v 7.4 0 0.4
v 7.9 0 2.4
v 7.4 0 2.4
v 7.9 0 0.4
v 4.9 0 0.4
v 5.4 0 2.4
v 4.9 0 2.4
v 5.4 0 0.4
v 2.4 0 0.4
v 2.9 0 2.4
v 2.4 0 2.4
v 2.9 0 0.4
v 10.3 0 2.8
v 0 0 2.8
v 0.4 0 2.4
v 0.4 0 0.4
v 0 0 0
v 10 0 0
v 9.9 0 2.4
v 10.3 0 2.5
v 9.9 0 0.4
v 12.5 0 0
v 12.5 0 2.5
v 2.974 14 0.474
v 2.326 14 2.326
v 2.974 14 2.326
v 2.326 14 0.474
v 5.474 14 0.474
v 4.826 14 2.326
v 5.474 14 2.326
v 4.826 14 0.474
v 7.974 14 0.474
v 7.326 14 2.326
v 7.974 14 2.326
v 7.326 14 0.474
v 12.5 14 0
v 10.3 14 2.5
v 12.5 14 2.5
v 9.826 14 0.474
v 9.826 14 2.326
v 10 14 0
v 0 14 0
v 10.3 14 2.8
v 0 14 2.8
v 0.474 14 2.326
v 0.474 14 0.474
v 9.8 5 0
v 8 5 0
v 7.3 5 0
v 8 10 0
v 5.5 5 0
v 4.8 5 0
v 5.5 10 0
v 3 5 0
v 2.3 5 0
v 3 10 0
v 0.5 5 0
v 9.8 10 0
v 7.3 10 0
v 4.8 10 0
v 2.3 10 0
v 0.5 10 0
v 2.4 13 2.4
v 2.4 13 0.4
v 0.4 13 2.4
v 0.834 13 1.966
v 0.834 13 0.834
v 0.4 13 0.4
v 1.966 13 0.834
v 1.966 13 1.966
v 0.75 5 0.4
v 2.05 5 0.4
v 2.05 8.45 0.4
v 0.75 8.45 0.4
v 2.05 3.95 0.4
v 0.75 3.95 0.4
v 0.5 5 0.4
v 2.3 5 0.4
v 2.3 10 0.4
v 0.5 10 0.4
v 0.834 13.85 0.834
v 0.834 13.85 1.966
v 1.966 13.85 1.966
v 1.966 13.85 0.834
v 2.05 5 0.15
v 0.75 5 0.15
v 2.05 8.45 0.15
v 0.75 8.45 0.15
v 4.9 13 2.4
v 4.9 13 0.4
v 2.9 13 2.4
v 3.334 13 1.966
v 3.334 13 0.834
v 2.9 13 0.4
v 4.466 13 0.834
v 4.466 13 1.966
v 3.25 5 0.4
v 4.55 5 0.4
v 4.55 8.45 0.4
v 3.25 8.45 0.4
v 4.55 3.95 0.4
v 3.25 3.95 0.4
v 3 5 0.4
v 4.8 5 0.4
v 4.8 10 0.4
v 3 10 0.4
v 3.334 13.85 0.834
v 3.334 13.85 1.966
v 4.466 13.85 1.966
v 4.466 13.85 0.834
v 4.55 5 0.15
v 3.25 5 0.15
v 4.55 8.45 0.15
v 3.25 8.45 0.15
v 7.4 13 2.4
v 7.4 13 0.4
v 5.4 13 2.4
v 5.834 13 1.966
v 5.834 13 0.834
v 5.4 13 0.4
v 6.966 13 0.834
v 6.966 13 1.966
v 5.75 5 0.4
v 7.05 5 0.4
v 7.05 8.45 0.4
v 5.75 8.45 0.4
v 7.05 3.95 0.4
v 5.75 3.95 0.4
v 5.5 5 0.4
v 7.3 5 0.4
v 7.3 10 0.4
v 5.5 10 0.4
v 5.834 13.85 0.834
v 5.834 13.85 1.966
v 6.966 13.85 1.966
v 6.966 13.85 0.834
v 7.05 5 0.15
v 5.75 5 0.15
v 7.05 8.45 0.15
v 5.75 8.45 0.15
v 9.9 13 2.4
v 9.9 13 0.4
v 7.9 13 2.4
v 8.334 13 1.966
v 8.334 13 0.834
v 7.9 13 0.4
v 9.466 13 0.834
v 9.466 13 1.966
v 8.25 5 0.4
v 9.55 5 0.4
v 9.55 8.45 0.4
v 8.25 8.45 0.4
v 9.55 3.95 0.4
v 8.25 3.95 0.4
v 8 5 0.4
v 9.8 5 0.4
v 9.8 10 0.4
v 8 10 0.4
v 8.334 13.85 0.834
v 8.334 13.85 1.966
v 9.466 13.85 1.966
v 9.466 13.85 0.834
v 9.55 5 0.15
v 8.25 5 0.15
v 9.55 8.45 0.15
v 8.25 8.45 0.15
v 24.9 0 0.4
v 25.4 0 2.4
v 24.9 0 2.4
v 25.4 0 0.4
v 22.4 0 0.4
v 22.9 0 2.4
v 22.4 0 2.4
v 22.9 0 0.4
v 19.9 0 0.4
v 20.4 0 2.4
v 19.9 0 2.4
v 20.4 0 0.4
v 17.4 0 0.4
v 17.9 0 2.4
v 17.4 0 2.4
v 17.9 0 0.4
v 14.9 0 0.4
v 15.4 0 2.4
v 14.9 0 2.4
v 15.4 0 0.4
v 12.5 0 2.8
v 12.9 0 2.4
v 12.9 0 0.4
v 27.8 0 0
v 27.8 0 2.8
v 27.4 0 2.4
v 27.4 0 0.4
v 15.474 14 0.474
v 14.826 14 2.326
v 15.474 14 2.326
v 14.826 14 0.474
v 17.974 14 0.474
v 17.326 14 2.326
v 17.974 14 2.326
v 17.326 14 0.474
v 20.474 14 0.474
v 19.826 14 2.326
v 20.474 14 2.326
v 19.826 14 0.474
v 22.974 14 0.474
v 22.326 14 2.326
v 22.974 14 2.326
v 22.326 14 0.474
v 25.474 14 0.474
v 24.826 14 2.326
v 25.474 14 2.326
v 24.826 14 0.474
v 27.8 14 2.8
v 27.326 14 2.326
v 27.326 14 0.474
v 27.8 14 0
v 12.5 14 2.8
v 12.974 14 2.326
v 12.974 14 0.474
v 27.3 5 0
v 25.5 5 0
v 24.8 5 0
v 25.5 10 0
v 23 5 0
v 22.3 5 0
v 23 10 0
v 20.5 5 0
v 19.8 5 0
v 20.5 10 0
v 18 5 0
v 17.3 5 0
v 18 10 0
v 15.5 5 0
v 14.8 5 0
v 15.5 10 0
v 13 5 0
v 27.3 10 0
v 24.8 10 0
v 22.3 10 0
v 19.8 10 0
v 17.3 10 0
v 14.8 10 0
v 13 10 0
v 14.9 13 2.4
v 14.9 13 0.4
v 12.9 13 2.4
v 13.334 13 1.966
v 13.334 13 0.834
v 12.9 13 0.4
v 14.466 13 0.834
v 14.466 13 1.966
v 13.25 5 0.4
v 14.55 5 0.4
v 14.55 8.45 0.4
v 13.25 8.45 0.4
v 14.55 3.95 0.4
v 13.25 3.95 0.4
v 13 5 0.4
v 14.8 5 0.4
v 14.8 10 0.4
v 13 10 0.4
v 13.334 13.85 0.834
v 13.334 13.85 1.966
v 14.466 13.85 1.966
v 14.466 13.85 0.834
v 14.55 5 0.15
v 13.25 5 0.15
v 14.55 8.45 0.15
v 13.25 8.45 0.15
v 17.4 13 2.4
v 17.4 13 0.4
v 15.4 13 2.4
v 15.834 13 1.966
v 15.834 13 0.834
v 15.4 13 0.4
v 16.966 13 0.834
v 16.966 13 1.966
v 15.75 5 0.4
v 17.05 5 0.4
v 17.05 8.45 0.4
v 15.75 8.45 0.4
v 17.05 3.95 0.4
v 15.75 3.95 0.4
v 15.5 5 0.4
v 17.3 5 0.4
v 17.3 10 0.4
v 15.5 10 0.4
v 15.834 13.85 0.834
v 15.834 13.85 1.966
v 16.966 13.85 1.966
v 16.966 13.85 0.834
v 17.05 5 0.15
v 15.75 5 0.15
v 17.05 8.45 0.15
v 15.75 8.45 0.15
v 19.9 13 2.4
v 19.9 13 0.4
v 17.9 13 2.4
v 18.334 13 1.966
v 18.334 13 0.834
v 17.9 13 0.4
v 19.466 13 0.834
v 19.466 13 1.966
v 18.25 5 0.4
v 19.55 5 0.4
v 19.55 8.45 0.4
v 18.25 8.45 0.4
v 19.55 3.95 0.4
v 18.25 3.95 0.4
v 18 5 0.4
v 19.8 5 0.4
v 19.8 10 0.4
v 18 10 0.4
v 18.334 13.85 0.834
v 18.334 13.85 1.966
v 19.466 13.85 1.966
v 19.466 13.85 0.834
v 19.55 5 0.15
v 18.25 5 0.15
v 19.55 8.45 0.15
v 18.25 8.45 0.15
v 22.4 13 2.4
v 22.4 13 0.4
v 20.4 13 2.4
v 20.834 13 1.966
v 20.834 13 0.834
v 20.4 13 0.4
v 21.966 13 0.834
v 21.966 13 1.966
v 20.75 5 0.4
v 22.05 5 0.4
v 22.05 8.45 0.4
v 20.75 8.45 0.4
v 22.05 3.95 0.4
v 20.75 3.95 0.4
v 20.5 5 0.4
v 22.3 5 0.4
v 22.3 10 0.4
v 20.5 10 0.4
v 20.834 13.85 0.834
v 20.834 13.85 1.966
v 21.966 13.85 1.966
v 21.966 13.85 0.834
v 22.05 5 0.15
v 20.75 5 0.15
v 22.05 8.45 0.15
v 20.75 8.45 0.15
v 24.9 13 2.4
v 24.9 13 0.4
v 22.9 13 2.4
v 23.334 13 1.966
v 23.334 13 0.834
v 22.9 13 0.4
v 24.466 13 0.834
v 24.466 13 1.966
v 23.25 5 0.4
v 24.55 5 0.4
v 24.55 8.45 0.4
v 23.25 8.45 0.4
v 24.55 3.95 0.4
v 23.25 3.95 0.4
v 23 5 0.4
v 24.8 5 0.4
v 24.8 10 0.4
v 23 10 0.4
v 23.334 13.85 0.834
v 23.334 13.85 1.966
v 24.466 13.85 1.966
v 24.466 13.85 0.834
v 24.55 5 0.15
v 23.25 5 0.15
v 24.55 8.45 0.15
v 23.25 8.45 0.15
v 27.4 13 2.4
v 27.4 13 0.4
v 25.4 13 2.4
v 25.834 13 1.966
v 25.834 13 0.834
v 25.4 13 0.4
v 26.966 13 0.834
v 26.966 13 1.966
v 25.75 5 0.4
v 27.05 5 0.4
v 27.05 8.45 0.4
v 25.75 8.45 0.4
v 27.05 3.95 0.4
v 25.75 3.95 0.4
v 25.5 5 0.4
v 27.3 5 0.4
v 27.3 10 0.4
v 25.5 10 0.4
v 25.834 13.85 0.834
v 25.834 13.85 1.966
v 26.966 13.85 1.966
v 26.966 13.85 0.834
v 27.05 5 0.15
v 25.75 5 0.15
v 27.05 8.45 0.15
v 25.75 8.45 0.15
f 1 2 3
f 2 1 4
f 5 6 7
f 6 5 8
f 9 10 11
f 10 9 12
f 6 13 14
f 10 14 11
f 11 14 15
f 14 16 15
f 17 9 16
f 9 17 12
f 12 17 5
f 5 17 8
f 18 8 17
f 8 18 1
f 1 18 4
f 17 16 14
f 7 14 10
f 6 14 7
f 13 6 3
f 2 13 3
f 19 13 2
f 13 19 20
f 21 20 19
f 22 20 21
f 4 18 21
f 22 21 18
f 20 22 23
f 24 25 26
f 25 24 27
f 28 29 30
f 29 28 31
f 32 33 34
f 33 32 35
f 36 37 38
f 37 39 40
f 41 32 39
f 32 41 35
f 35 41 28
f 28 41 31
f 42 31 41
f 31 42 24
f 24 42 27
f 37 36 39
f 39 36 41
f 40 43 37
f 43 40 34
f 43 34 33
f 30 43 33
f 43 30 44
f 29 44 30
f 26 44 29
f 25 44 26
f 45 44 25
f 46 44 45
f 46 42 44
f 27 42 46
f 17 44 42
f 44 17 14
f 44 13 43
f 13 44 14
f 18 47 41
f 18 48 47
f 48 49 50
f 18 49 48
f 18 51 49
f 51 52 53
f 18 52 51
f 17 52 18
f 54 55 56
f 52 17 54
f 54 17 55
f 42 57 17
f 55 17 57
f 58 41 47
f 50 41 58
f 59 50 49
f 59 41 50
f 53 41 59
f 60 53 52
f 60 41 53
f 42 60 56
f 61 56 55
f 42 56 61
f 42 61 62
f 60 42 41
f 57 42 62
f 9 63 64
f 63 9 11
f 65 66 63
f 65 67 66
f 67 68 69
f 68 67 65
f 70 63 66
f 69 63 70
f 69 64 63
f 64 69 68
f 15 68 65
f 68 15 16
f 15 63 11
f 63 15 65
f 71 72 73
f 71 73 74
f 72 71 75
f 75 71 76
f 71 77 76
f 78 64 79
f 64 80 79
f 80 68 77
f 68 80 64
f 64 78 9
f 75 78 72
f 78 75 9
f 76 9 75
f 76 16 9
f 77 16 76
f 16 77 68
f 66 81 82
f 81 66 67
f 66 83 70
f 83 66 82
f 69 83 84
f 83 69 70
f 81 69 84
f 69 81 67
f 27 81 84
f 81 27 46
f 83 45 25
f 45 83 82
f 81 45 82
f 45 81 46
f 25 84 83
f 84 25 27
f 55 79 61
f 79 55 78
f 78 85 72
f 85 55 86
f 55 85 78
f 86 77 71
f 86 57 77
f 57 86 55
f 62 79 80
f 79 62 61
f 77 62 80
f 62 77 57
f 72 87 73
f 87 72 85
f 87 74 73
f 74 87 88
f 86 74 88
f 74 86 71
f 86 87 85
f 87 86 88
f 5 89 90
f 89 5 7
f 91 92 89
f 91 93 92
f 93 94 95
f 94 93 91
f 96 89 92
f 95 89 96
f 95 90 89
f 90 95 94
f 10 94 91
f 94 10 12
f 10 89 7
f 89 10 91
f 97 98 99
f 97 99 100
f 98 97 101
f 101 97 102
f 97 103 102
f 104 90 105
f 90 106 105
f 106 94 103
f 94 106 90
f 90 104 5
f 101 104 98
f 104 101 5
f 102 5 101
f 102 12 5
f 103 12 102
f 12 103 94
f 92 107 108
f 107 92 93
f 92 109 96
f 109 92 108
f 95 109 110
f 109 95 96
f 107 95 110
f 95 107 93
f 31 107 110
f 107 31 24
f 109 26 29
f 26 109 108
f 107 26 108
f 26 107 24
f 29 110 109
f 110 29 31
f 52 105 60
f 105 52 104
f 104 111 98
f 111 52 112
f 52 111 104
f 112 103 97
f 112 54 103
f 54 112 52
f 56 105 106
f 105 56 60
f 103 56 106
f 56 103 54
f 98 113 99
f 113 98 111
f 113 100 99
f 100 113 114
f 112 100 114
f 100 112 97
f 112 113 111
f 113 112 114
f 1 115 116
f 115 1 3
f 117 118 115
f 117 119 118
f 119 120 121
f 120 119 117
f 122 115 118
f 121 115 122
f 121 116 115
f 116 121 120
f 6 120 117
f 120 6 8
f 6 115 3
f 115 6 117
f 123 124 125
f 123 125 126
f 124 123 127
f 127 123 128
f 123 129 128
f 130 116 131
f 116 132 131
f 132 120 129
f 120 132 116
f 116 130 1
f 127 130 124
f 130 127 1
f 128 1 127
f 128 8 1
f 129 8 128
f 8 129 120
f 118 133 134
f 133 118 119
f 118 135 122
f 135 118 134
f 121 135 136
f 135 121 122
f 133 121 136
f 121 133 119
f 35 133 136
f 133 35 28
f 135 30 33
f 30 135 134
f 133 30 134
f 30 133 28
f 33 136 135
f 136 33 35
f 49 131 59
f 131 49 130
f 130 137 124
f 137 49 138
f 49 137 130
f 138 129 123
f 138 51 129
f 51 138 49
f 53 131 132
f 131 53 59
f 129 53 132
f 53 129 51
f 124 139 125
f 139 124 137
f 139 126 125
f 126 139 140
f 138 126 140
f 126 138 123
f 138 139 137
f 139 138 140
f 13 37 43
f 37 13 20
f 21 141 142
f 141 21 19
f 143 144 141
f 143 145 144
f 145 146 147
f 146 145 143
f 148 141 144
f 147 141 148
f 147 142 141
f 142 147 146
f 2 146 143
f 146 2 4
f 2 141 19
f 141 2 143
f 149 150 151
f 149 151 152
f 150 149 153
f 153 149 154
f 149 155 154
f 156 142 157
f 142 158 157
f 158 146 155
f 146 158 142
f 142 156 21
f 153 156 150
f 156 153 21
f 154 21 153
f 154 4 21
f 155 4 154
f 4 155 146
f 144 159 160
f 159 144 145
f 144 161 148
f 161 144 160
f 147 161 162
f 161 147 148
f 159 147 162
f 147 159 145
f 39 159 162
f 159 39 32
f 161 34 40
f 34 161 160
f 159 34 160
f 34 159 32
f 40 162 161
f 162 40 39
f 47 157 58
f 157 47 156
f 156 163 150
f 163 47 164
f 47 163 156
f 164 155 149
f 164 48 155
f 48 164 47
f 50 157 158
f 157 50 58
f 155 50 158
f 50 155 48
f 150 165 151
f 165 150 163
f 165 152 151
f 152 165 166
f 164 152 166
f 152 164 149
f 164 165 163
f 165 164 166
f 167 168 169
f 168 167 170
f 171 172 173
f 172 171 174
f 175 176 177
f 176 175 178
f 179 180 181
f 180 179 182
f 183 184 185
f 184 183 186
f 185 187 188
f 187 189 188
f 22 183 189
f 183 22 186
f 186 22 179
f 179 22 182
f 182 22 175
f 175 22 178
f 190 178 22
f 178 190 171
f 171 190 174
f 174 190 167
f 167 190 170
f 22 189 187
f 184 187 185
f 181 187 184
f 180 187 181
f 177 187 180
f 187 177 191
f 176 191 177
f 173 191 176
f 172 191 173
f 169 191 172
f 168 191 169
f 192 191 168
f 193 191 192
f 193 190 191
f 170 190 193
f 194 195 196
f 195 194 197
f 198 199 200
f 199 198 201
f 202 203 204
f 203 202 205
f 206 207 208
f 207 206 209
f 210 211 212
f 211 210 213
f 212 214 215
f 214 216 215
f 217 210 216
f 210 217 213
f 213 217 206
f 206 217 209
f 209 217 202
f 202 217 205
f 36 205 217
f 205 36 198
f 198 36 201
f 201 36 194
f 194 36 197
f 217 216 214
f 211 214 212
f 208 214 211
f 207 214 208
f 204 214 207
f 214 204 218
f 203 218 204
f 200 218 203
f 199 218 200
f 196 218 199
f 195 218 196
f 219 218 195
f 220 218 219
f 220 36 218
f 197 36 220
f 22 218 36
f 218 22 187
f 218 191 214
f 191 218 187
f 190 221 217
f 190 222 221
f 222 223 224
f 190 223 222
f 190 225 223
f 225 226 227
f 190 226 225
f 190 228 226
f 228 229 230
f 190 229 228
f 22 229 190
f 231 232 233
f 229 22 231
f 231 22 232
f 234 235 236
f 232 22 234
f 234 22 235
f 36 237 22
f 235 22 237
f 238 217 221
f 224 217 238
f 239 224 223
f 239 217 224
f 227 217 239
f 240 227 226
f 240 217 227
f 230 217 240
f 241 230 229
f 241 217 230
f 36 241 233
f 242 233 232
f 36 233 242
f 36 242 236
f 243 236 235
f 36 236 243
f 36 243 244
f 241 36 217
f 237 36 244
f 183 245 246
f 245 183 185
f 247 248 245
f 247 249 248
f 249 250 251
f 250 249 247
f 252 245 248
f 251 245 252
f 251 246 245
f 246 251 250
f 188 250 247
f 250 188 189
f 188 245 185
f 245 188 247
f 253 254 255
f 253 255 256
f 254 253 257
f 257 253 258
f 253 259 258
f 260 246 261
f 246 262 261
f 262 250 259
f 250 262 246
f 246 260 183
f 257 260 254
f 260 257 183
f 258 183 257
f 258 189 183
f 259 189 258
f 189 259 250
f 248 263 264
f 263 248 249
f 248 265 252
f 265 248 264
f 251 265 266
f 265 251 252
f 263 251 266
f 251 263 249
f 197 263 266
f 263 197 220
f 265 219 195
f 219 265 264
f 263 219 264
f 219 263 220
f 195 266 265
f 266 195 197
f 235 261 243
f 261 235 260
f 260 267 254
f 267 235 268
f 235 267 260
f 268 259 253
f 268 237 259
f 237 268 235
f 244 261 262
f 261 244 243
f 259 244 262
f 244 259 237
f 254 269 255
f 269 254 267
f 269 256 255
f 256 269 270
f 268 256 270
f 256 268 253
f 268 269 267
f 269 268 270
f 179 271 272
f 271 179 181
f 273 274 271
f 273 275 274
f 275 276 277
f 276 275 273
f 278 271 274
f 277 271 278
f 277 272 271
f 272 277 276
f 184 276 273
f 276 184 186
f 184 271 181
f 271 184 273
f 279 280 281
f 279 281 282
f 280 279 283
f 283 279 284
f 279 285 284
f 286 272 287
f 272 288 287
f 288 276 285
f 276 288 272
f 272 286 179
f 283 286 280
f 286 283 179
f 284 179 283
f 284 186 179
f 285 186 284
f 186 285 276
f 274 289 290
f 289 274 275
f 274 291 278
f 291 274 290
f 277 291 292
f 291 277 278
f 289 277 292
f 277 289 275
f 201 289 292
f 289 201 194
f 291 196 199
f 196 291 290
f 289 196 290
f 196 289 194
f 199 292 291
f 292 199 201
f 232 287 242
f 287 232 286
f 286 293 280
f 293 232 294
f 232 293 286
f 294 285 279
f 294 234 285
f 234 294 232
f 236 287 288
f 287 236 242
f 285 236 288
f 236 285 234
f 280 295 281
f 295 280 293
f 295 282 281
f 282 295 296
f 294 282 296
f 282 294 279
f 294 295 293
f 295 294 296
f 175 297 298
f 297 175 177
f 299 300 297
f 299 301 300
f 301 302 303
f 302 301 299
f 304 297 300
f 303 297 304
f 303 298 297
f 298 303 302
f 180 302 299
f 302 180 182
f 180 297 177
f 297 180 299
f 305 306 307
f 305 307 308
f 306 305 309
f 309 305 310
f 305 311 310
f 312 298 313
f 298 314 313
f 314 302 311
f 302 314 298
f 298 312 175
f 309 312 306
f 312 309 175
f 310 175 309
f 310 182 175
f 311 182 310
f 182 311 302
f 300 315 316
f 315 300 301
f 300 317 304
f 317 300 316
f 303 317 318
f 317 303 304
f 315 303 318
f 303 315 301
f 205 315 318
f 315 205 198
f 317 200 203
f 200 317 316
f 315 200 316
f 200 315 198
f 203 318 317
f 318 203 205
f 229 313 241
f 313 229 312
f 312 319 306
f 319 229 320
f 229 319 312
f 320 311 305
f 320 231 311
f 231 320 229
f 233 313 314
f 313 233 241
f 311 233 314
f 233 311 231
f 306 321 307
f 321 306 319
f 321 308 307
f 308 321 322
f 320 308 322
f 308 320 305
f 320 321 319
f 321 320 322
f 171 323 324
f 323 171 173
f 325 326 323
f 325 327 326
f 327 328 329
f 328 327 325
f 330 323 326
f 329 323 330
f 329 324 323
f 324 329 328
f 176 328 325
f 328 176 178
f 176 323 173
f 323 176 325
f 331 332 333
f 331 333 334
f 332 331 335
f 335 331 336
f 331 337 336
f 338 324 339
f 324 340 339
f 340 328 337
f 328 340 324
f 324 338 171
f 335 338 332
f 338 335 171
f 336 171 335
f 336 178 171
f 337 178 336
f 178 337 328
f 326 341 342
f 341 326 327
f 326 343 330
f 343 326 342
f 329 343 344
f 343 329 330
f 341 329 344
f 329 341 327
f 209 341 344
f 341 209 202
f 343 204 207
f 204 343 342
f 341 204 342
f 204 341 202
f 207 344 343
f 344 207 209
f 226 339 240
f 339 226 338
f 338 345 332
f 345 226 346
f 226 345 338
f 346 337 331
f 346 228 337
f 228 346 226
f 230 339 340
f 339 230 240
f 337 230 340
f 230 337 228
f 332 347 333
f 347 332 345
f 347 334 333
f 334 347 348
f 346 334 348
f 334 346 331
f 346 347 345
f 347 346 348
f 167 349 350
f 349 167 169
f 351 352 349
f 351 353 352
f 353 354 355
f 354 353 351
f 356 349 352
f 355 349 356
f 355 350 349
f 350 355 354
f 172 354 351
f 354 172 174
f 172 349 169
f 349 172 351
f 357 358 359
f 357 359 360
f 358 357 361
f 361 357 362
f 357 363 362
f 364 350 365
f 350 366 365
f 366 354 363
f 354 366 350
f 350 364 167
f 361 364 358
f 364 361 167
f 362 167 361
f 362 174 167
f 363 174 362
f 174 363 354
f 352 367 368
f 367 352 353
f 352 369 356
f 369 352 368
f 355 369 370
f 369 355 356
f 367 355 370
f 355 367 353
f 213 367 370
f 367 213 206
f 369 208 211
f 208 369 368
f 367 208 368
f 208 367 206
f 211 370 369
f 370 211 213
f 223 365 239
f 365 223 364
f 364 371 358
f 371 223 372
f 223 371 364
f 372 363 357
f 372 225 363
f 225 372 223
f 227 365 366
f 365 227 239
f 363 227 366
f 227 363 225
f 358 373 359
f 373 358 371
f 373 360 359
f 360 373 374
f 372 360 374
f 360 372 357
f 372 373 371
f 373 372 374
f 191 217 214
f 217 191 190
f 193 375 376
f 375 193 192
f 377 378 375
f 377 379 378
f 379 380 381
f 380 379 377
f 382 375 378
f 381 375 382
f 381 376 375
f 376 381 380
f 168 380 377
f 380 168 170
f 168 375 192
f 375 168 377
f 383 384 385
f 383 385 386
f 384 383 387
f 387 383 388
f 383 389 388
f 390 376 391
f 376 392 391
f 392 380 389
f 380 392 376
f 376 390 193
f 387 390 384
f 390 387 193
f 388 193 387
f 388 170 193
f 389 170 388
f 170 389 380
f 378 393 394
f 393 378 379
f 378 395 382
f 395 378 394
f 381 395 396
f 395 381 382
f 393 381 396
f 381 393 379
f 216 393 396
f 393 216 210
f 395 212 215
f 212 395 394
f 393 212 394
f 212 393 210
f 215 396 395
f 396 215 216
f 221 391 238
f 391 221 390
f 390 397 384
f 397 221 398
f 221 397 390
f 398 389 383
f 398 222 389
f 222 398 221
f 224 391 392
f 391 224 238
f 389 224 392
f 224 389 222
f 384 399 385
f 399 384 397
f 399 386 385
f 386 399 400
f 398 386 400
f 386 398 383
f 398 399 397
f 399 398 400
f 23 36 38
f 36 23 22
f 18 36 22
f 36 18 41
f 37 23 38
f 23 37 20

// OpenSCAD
/*
 * This scad was created by L. Blue Cuenca (https://www.thingiverse.com/azuer88/about)
 * https://www.thingiverse.com/thing:3067259
 */

//the number of "shells" to make
count = 11; // [1:10]
solid = 4;
module shell() {
    translate([2.8/2, 7, 2.8/2]) 
    rotate([90, 0, 0])
    union() {
        difference() {
            cube([2.8, 2.8, 14], center=true);
            // inner hole/hollow
            translate([0, 0, 1])
                cube([2, 2, 14], center=true);
            // pin hole
            rotate([0, 0, 45])
                cylinder(r=0.8, h=60, center=true, $fn=4);
            // chamfer
            translate([0, 0, -7.1]) rotate([0, 0, 45]) 
                cylinder(r1=2.5, r2=0.8, h=0.5, center=true, $fn=4);
            // tab hole 
            translate([0, -1, -0.5])
            cube([1.8, 1, 5], center=true);
        }
        // tab
         translate([0, -1.125, 0.8])
            cube([1.3, 0.25, 4.5], center=true);
    }
}

module shellx() {
    translate([2.5/2, 7, 2.5/2]) 
    rotate([90, 0, 0])
           cube([2.5, 2.5, 14], center=true);
};

 for(i = [0:count-1]) 
    translate([2.5*i, 0, 0]) 
     if (i==solid) shellx(); else   shell();
